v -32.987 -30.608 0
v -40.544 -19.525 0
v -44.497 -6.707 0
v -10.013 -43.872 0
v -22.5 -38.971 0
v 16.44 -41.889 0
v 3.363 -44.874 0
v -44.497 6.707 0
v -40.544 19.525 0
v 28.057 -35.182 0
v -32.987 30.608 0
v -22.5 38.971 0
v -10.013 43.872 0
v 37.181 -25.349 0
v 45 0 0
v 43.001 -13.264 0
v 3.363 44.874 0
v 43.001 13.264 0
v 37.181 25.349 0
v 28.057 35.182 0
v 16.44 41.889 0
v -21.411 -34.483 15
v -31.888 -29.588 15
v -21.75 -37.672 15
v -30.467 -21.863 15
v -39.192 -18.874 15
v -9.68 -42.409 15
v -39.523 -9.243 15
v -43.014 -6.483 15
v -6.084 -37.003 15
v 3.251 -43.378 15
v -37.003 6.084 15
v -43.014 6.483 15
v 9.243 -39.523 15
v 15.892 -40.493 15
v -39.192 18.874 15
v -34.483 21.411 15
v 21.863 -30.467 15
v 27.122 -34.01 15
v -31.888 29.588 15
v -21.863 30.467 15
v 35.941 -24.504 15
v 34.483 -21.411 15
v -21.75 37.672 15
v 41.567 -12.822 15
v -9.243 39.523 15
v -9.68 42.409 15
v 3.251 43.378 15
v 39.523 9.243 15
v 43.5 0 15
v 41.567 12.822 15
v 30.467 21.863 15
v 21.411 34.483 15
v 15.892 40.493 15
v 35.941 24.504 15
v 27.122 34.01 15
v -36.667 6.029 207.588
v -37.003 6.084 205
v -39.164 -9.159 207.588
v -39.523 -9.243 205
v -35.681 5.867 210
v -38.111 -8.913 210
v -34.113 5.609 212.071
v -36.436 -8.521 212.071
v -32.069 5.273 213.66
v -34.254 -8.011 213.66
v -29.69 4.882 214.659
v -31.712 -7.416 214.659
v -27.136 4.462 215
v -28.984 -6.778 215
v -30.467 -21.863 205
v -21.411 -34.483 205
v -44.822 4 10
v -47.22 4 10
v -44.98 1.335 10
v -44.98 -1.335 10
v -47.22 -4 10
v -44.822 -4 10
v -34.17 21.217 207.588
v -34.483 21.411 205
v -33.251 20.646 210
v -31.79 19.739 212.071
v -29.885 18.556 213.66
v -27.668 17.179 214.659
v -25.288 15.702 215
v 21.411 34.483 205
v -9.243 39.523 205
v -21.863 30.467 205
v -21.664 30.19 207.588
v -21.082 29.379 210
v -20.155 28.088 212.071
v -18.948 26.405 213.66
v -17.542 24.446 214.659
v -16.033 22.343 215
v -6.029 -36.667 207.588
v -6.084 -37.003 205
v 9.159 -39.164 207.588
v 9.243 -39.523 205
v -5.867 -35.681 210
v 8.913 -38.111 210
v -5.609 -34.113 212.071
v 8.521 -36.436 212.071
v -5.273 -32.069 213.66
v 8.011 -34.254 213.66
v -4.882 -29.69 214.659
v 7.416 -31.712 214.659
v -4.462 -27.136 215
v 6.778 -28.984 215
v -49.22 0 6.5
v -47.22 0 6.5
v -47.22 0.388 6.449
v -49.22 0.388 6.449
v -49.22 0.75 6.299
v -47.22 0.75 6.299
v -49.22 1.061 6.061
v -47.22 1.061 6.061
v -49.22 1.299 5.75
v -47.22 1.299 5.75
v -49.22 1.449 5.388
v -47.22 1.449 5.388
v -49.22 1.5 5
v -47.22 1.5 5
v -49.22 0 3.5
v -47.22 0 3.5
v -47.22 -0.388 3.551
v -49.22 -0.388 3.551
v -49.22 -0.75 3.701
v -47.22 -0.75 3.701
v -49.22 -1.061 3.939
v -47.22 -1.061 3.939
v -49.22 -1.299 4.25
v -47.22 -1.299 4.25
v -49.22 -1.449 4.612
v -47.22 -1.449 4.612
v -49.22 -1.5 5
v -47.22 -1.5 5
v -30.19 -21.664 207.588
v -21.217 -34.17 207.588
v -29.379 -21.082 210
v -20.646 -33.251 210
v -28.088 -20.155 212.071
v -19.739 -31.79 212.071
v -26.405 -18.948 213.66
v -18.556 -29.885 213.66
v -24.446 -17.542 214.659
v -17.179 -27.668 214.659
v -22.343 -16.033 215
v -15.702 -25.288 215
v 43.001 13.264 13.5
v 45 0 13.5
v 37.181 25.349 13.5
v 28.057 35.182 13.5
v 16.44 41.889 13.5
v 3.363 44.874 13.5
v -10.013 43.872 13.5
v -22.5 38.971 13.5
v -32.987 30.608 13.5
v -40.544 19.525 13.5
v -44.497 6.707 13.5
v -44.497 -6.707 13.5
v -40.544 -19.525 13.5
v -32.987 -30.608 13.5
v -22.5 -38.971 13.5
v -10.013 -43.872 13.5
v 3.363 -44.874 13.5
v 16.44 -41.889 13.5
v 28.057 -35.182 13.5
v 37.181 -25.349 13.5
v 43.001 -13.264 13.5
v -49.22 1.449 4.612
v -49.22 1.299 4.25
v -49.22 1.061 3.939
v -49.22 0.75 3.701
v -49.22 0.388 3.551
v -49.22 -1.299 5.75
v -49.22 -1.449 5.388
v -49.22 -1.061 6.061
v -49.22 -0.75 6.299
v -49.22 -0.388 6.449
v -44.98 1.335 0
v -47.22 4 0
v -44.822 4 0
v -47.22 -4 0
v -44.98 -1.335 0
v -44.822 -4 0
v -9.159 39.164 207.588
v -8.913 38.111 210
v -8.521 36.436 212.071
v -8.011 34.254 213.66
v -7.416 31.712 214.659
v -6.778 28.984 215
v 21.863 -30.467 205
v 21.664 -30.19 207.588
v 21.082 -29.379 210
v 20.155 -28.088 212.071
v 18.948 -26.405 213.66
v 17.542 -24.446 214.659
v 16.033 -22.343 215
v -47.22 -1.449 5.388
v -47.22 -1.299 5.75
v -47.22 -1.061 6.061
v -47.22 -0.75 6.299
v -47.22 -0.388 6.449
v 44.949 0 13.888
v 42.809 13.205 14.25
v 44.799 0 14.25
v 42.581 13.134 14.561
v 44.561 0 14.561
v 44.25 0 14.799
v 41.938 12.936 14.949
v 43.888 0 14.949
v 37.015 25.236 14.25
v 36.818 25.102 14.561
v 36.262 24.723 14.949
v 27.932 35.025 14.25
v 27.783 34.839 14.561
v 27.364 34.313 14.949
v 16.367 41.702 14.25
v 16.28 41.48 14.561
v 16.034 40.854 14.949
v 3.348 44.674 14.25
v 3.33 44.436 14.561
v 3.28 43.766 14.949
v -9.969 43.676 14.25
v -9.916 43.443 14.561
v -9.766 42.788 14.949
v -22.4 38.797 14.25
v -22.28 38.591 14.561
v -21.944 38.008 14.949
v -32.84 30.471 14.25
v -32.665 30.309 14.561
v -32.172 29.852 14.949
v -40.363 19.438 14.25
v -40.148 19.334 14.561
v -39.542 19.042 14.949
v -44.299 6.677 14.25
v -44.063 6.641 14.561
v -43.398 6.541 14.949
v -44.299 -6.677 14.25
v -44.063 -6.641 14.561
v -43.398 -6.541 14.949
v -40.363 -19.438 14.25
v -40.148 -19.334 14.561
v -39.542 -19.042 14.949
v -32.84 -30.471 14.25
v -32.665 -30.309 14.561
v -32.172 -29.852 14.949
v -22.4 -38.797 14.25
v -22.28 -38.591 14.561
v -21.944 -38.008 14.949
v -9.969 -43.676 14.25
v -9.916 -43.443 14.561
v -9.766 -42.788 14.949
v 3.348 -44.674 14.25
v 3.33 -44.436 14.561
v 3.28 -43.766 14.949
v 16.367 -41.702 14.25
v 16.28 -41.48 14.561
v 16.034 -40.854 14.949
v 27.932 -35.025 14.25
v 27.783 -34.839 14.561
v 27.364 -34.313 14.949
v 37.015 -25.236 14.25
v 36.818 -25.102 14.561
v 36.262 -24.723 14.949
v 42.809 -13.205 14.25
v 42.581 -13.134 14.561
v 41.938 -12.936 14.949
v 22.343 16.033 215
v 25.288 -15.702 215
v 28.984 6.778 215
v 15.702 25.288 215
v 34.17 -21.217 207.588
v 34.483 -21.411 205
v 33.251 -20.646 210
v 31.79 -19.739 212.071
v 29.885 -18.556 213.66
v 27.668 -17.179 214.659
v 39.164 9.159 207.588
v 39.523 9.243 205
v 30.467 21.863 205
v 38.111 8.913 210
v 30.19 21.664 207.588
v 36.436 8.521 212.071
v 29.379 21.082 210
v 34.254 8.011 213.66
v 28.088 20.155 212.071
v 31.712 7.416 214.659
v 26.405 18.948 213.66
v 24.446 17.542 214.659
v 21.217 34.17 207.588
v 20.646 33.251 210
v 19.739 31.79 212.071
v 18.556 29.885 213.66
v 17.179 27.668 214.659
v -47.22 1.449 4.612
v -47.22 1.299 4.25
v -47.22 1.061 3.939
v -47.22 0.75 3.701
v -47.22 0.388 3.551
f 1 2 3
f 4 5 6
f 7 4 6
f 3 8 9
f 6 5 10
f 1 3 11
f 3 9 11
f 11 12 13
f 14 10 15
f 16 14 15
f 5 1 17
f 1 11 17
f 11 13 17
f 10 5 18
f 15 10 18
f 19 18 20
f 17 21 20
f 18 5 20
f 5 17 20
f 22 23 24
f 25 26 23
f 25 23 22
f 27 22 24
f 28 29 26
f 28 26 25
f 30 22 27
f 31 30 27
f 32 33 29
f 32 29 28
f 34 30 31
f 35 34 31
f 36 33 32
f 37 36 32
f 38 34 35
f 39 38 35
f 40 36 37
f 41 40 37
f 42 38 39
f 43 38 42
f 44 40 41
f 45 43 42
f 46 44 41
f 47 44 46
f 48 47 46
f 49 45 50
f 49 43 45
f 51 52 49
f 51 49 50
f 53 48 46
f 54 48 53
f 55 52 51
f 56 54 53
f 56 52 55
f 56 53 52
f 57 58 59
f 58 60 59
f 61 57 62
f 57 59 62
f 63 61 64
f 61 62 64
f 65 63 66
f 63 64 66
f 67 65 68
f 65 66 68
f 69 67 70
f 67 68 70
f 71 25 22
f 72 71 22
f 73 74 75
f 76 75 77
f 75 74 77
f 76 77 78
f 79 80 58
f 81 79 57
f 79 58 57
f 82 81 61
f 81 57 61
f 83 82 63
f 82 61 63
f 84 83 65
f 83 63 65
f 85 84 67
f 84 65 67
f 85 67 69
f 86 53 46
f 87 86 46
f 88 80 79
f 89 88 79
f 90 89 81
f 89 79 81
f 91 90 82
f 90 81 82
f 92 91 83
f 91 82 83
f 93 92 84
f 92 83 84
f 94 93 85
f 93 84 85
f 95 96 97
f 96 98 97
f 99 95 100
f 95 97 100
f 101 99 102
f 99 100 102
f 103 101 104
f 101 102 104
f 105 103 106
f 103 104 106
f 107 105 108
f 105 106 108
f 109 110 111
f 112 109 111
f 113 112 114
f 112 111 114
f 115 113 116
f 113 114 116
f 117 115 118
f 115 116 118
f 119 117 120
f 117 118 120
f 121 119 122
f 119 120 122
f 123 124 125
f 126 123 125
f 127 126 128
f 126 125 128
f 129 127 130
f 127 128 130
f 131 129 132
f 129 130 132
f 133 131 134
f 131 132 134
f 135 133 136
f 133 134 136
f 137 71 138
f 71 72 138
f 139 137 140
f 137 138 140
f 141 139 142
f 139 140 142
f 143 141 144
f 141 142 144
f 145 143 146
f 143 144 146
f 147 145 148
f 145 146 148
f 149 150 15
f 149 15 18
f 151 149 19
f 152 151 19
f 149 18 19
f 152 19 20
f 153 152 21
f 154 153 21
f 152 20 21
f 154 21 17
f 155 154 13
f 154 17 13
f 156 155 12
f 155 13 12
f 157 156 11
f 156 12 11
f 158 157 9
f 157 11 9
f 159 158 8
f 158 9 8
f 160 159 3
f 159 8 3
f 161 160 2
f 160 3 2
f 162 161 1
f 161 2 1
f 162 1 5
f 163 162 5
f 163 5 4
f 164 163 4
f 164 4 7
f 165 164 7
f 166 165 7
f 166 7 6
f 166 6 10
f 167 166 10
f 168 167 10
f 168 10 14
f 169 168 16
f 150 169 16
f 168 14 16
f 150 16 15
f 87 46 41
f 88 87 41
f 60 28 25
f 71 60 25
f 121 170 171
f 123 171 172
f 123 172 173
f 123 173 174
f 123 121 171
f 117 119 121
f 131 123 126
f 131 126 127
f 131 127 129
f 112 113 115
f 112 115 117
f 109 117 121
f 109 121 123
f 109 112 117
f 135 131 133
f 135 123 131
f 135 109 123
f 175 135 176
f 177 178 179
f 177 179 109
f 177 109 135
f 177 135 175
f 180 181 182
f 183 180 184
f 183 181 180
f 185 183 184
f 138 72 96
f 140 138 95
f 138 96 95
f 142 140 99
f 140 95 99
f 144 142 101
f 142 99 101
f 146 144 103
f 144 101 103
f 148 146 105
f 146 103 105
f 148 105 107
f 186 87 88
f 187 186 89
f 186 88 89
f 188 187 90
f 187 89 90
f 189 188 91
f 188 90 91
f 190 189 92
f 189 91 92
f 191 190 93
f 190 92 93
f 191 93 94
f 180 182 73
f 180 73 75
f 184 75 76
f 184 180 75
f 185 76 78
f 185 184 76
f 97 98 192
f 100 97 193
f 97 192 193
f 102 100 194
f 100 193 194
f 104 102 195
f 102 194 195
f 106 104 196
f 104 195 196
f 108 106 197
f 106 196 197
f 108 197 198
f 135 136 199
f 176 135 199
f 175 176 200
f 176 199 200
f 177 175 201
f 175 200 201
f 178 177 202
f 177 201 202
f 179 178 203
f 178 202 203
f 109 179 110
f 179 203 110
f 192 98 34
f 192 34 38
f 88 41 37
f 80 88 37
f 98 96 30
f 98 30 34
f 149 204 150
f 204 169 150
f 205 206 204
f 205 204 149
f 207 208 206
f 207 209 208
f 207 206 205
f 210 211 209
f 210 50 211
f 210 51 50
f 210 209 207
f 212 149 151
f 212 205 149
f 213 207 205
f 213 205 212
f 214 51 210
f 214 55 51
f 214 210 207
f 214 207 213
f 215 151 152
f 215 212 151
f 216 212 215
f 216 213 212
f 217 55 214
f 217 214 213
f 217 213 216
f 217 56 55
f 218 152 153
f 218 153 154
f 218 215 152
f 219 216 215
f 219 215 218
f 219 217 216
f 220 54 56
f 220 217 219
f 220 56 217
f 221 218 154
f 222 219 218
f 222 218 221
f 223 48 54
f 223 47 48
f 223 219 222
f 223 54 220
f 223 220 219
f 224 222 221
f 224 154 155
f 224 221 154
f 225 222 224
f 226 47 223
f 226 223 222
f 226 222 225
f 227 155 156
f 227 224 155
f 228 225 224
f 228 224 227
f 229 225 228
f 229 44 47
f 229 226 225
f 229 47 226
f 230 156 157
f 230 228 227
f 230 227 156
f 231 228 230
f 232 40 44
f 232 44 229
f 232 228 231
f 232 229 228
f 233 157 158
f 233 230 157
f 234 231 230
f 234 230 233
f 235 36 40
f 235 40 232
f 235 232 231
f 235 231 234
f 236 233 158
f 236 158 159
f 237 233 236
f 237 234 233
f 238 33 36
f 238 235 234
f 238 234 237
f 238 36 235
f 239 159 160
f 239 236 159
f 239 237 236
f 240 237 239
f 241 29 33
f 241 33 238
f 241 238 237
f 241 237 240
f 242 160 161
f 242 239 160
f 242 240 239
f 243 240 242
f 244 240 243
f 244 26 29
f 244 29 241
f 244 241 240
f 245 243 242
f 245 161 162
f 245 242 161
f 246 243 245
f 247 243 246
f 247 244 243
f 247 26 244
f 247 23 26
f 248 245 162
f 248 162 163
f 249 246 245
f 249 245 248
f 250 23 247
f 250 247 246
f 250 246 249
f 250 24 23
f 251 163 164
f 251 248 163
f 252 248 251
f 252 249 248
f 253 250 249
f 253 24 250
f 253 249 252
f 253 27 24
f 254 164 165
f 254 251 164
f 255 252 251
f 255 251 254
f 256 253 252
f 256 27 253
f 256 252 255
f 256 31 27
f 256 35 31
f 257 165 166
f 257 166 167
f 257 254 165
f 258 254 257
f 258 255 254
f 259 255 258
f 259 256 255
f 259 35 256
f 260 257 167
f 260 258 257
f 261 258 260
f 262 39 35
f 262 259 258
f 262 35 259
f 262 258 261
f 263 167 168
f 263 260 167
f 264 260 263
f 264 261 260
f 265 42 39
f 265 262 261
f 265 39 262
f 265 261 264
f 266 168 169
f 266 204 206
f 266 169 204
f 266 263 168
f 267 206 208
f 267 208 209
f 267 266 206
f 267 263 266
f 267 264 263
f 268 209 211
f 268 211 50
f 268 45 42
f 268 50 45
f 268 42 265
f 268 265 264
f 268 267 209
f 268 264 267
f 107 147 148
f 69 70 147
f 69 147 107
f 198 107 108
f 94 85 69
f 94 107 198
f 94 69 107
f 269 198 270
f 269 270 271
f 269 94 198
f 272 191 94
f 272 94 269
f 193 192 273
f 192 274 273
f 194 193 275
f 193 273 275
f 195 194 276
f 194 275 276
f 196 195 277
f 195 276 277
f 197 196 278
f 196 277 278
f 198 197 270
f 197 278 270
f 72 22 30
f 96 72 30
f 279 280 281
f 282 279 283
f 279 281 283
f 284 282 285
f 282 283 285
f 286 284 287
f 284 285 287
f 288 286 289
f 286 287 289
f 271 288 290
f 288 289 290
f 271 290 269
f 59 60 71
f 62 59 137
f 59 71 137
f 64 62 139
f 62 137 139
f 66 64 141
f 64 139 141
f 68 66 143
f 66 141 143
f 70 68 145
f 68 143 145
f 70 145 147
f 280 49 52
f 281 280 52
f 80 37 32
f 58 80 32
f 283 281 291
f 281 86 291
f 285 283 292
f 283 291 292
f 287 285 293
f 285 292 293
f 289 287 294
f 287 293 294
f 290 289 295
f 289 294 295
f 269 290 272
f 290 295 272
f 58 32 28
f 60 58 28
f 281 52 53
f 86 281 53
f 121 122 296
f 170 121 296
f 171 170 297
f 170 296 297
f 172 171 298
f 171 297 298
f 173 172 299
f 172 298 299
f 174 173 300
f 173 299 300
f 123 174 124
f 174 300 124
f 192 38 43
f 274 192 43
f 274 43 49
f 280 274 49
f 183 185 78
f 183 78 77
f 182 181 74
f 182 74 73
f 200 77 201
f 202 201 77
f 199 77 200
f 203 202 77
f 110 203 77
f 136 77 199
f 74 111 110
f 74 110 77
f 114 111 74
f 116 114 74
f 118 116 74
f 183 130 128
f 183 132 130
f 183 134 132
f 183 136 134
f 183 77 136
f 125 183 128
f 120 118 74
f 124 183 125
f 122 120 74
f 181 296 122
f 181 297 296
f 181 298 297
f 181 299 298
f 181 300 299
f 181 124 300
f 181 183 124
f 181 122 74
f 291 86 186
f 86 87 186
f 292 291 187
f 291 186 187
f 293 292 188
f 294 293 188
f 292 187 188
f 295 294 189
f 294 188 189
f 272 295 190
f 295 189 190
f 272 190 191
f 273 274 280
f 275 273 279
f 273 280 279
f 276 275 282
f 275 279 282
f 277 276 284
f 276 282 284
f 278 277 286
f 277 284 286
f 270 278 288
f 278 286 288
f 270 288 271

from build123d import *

# Parameters (mm, degrees)
F0_R     = 45
F1_DEPTH = 15
F3_DEPTH = 200
F5_R     = 1.5
F7_DEPTH = 10
F9_DEPTH = 2
F10_R    = 10


with BuildPart() as f1:
    # F0 (on Top) → F1 (new body)
    with BuildSketch(Plane.XY):
        Circle(F0_R)
    extrude(amount=F1_DEPTH)

    # F2 (on face) → F3 (join)
    with BuildSketch(Plane.XY.offset(15)):
        with BuildLine():
            ThreePointArc((-37.0031531736, 6.0841314261), (-31.8581593507, 19.7814984969), (-21.8630493056, 30.4673115824))
            Line((-21.8630493056, 30.4673115824), (-34.4830231078, 21.4113398267))
            Line((-34.4830231078, 21.4113398267), (-37.0031531736, 6.0841314261))
        make_face()
        with BuildLine():
            ThreePointArc((-21.8630493056, 30.4673115824), (-8.5394884365, 36.5147523235), (6.08413213, 37.0031530579))
            Line((6.08413213, 37.0031530579), (-9.2430758896, 39.5232830611))
            Line((-9.2430758896, 39.5232830611), (-21.8630493056, 30.4673115824))
        make_face()
        with BuildLine():
            ThreePointArc((6.08413213, 37.0031530579), (19.7814989367, 31.8581590776), (30.4673117702, 21.863049044))
            Line((30.4673117702, 21.863049044), (21.4113398267, 34.4830231078))
            Line((21.4113398267, 34.4830231078), (6.08413213, 37.0031530579))
        make_face()
        with BuildLine():
            ThreePointArc((30.4673117702, 21.863049044), (35.6985587341, 11.483157419), (37.5, 0))
            ThreePointArc((37.5, 0), (37.3755819089, -3.0521921581), (37.0031532283, -6.0841310937))
            Line((37.0031532283, -6.0841310937), (39.5232830611, 9.2430758896))
            Line((39.5232830611, 9.2430758896), (30.4673117702, 21.863049044))
        make_face()
        with BuildLine():
            ThreePointArc((-30.4673118862, -21.8630488823), (-36.5147523015, -8.5394885302), (-37.0031531736, 6.0841314261))
            Line((-37.0031531736, 6.0841314261), (-39.5232830611, -9.2430758896))
            Line((-39.5232830611, -9.2430758896), (-30.4673118862, -21.8630488823))
        make_face()
        with BuildLine():
            Line((-21.4113398267, -34.4830231078), (-6.084131695, -37.0031531294))
            ThreePointArc((-6.084131695, -37.0031531294), (-19.781498834, -31.8581591414), (-30.4673118862, -21.8630488823))
            Line((-30.4673118862, -21.8630488823), (-21.4113398267, -34.4830231078))
        make_face()
        with BuildLine():
            Line((9.2430758896, -39.5232830611), (21.8630489822, -30.4673118145))
            ThreePointArc((21.8630489822, -30.4673118145), (8.5394884574, -36.5147523186), (-6.084131695, -37.0031531294))
            Line((-6.084131695, -37.0031531294), (9.2430758896, -39.5232830611))
        make_face()
        with BuildLine():
            Line((34.4830231078, -21.4113398267), (37.0031532283, -6.0841310937))
            ThreePointArc((37.0031532283, -6.0841310937), (31.8581593346, -19.7814985229), (21.8630489822, -30.4673118145))
            Line((21.8630489822, -30.4673118145), (34.4830231078, -21.4113398267))
        make_face()
        with BuildLine():
            ThreePointArc((37.0031532283, -6.0841310937), (37.3755819089, -3.0521921581), (37.5, 0))
            ThreePointArc((37.5, 0), (35.6985587341, 11.483157419), (30.4673117702, 21.863049044))
            ThreePointArc((30.4673117702, 21.863049044), (19.7814989367, 31.8581590776), (6.08413213, 37.0031530579))
            ThreePointArc((6.08413213, 37.0031530579), (-8.5394884365, 36.5147523235), (-21.8630493056, 30.4673115824))
            ThreePointArc((-21.8630493056, 30.4673115824), (-31.8581593507, 19.7814984969), (-37.0031531736, 6.0841314261))
            ThreePointArc((-37.0031531736, 6.0841314261), (-36.5147523015, -8.5394885302), (-30.4673118862, -21.8630488823))
            ThreePointArc((-30.4673118862, -21.8630488823), (-19.781498834, -31.8581591414), (-6.084131695, -37.0031531294))
            ThreePointArc((-6.084131695, -37.0031531294), (8.5394884574, -36.5147523186), (21.8630489822, -30.4673118145))
            ThreePointArc((21.8630489822, -30.4673118145), (31.8581593346, -19.7814985229), (37.0031532283, -6.0841310937))
        make_face()
    extrude(amount=F3_DEPTH)

    # F5
    f5_edges = [f1.edges().sort_by_distance(p)[0] for p in [
        (-45, 0, 15),
    ]]
    fillet(f5_edges, radius=F5_R)

    # F10
    f10_edges = [f1.edges().sort_by_distance(p)[0] for p in [
        (-37.003153, 6.084132, 215),
        (-30.467311, -21.863049, 215),
        (-6.084132, -37.003153, 215),
        (21.863049, -30.467311, 215),
        (37.003153, -6.084132, 215),
        (30.467311, 21.863049, 215),
        (6.084132, 37.003153, 215),
        (-21.863049, 30.467311, 215),
    ]]
    fillet(f10_edges, radius=F10_R)


with BuildPart() as f7:
    # F6 (on face) → F7 (new body)
    with BuildSketch(Plane(origin=(0, 0, 0), x_dir=(1, 0, 0), z_dir=(0, 0, -1))):
        with BuildLine():
            ThreePointArc((-44.821869662, -4), (-45, 0), (-44.821869662, 4))
            Line((-44.821869662, 4), (-47.2203977406, 4))
            Line((-47.2203977406, 4), (-47.2203977406, -4))
            Line((-47.2203977406, -4), (-44.821869662, -4))
        make_face()
    extrude(amount=-F7_DEPTH)

    # F8 (on face) → F9 (join)
    with BuildSketch(Plane(origin=(-47.2203977406, 0, 0), x_dir=(0, -1, 0), z_dir=(-1, 0, 0))):
        with BuildLine():
            Line((0, 5), (0, 6.5))
            ThreePointArc((0, 6.5), (-1.0606601718, 6.0606601718), (-1.5, 5))
            Line((-1.5, 5), (0, 5))
        make_face()
        with BuildLine():
            ThreePointArc((1.5, 5), (1.0606601718, 6.0606601718), (0, 6.5))
            Line((0, 6.5), (0, 5))
            Line((0, 5), (1.5, 5))
        make_face()
        with BuildLine():
            Line((1.5, 5), (0, 5))
            Line((0, 5), (0, 3.5))
            ThreePointArc((0, 3.5), (1.0606601718, 3.9393398282), (1.5, 5))
        make_face()
        with BuildLine():
            Line((0, 3.5), (0, 5))
            Line((0, 5), (-1.5, 5))
            ThreePointArc((-1.5, 5), (-1.0606601718, 3.9393398282), (0, 3.5))
        make_face()
    extrude(amount=F9_DEPTH)


solid = Compound([f1.part, f7.part])
